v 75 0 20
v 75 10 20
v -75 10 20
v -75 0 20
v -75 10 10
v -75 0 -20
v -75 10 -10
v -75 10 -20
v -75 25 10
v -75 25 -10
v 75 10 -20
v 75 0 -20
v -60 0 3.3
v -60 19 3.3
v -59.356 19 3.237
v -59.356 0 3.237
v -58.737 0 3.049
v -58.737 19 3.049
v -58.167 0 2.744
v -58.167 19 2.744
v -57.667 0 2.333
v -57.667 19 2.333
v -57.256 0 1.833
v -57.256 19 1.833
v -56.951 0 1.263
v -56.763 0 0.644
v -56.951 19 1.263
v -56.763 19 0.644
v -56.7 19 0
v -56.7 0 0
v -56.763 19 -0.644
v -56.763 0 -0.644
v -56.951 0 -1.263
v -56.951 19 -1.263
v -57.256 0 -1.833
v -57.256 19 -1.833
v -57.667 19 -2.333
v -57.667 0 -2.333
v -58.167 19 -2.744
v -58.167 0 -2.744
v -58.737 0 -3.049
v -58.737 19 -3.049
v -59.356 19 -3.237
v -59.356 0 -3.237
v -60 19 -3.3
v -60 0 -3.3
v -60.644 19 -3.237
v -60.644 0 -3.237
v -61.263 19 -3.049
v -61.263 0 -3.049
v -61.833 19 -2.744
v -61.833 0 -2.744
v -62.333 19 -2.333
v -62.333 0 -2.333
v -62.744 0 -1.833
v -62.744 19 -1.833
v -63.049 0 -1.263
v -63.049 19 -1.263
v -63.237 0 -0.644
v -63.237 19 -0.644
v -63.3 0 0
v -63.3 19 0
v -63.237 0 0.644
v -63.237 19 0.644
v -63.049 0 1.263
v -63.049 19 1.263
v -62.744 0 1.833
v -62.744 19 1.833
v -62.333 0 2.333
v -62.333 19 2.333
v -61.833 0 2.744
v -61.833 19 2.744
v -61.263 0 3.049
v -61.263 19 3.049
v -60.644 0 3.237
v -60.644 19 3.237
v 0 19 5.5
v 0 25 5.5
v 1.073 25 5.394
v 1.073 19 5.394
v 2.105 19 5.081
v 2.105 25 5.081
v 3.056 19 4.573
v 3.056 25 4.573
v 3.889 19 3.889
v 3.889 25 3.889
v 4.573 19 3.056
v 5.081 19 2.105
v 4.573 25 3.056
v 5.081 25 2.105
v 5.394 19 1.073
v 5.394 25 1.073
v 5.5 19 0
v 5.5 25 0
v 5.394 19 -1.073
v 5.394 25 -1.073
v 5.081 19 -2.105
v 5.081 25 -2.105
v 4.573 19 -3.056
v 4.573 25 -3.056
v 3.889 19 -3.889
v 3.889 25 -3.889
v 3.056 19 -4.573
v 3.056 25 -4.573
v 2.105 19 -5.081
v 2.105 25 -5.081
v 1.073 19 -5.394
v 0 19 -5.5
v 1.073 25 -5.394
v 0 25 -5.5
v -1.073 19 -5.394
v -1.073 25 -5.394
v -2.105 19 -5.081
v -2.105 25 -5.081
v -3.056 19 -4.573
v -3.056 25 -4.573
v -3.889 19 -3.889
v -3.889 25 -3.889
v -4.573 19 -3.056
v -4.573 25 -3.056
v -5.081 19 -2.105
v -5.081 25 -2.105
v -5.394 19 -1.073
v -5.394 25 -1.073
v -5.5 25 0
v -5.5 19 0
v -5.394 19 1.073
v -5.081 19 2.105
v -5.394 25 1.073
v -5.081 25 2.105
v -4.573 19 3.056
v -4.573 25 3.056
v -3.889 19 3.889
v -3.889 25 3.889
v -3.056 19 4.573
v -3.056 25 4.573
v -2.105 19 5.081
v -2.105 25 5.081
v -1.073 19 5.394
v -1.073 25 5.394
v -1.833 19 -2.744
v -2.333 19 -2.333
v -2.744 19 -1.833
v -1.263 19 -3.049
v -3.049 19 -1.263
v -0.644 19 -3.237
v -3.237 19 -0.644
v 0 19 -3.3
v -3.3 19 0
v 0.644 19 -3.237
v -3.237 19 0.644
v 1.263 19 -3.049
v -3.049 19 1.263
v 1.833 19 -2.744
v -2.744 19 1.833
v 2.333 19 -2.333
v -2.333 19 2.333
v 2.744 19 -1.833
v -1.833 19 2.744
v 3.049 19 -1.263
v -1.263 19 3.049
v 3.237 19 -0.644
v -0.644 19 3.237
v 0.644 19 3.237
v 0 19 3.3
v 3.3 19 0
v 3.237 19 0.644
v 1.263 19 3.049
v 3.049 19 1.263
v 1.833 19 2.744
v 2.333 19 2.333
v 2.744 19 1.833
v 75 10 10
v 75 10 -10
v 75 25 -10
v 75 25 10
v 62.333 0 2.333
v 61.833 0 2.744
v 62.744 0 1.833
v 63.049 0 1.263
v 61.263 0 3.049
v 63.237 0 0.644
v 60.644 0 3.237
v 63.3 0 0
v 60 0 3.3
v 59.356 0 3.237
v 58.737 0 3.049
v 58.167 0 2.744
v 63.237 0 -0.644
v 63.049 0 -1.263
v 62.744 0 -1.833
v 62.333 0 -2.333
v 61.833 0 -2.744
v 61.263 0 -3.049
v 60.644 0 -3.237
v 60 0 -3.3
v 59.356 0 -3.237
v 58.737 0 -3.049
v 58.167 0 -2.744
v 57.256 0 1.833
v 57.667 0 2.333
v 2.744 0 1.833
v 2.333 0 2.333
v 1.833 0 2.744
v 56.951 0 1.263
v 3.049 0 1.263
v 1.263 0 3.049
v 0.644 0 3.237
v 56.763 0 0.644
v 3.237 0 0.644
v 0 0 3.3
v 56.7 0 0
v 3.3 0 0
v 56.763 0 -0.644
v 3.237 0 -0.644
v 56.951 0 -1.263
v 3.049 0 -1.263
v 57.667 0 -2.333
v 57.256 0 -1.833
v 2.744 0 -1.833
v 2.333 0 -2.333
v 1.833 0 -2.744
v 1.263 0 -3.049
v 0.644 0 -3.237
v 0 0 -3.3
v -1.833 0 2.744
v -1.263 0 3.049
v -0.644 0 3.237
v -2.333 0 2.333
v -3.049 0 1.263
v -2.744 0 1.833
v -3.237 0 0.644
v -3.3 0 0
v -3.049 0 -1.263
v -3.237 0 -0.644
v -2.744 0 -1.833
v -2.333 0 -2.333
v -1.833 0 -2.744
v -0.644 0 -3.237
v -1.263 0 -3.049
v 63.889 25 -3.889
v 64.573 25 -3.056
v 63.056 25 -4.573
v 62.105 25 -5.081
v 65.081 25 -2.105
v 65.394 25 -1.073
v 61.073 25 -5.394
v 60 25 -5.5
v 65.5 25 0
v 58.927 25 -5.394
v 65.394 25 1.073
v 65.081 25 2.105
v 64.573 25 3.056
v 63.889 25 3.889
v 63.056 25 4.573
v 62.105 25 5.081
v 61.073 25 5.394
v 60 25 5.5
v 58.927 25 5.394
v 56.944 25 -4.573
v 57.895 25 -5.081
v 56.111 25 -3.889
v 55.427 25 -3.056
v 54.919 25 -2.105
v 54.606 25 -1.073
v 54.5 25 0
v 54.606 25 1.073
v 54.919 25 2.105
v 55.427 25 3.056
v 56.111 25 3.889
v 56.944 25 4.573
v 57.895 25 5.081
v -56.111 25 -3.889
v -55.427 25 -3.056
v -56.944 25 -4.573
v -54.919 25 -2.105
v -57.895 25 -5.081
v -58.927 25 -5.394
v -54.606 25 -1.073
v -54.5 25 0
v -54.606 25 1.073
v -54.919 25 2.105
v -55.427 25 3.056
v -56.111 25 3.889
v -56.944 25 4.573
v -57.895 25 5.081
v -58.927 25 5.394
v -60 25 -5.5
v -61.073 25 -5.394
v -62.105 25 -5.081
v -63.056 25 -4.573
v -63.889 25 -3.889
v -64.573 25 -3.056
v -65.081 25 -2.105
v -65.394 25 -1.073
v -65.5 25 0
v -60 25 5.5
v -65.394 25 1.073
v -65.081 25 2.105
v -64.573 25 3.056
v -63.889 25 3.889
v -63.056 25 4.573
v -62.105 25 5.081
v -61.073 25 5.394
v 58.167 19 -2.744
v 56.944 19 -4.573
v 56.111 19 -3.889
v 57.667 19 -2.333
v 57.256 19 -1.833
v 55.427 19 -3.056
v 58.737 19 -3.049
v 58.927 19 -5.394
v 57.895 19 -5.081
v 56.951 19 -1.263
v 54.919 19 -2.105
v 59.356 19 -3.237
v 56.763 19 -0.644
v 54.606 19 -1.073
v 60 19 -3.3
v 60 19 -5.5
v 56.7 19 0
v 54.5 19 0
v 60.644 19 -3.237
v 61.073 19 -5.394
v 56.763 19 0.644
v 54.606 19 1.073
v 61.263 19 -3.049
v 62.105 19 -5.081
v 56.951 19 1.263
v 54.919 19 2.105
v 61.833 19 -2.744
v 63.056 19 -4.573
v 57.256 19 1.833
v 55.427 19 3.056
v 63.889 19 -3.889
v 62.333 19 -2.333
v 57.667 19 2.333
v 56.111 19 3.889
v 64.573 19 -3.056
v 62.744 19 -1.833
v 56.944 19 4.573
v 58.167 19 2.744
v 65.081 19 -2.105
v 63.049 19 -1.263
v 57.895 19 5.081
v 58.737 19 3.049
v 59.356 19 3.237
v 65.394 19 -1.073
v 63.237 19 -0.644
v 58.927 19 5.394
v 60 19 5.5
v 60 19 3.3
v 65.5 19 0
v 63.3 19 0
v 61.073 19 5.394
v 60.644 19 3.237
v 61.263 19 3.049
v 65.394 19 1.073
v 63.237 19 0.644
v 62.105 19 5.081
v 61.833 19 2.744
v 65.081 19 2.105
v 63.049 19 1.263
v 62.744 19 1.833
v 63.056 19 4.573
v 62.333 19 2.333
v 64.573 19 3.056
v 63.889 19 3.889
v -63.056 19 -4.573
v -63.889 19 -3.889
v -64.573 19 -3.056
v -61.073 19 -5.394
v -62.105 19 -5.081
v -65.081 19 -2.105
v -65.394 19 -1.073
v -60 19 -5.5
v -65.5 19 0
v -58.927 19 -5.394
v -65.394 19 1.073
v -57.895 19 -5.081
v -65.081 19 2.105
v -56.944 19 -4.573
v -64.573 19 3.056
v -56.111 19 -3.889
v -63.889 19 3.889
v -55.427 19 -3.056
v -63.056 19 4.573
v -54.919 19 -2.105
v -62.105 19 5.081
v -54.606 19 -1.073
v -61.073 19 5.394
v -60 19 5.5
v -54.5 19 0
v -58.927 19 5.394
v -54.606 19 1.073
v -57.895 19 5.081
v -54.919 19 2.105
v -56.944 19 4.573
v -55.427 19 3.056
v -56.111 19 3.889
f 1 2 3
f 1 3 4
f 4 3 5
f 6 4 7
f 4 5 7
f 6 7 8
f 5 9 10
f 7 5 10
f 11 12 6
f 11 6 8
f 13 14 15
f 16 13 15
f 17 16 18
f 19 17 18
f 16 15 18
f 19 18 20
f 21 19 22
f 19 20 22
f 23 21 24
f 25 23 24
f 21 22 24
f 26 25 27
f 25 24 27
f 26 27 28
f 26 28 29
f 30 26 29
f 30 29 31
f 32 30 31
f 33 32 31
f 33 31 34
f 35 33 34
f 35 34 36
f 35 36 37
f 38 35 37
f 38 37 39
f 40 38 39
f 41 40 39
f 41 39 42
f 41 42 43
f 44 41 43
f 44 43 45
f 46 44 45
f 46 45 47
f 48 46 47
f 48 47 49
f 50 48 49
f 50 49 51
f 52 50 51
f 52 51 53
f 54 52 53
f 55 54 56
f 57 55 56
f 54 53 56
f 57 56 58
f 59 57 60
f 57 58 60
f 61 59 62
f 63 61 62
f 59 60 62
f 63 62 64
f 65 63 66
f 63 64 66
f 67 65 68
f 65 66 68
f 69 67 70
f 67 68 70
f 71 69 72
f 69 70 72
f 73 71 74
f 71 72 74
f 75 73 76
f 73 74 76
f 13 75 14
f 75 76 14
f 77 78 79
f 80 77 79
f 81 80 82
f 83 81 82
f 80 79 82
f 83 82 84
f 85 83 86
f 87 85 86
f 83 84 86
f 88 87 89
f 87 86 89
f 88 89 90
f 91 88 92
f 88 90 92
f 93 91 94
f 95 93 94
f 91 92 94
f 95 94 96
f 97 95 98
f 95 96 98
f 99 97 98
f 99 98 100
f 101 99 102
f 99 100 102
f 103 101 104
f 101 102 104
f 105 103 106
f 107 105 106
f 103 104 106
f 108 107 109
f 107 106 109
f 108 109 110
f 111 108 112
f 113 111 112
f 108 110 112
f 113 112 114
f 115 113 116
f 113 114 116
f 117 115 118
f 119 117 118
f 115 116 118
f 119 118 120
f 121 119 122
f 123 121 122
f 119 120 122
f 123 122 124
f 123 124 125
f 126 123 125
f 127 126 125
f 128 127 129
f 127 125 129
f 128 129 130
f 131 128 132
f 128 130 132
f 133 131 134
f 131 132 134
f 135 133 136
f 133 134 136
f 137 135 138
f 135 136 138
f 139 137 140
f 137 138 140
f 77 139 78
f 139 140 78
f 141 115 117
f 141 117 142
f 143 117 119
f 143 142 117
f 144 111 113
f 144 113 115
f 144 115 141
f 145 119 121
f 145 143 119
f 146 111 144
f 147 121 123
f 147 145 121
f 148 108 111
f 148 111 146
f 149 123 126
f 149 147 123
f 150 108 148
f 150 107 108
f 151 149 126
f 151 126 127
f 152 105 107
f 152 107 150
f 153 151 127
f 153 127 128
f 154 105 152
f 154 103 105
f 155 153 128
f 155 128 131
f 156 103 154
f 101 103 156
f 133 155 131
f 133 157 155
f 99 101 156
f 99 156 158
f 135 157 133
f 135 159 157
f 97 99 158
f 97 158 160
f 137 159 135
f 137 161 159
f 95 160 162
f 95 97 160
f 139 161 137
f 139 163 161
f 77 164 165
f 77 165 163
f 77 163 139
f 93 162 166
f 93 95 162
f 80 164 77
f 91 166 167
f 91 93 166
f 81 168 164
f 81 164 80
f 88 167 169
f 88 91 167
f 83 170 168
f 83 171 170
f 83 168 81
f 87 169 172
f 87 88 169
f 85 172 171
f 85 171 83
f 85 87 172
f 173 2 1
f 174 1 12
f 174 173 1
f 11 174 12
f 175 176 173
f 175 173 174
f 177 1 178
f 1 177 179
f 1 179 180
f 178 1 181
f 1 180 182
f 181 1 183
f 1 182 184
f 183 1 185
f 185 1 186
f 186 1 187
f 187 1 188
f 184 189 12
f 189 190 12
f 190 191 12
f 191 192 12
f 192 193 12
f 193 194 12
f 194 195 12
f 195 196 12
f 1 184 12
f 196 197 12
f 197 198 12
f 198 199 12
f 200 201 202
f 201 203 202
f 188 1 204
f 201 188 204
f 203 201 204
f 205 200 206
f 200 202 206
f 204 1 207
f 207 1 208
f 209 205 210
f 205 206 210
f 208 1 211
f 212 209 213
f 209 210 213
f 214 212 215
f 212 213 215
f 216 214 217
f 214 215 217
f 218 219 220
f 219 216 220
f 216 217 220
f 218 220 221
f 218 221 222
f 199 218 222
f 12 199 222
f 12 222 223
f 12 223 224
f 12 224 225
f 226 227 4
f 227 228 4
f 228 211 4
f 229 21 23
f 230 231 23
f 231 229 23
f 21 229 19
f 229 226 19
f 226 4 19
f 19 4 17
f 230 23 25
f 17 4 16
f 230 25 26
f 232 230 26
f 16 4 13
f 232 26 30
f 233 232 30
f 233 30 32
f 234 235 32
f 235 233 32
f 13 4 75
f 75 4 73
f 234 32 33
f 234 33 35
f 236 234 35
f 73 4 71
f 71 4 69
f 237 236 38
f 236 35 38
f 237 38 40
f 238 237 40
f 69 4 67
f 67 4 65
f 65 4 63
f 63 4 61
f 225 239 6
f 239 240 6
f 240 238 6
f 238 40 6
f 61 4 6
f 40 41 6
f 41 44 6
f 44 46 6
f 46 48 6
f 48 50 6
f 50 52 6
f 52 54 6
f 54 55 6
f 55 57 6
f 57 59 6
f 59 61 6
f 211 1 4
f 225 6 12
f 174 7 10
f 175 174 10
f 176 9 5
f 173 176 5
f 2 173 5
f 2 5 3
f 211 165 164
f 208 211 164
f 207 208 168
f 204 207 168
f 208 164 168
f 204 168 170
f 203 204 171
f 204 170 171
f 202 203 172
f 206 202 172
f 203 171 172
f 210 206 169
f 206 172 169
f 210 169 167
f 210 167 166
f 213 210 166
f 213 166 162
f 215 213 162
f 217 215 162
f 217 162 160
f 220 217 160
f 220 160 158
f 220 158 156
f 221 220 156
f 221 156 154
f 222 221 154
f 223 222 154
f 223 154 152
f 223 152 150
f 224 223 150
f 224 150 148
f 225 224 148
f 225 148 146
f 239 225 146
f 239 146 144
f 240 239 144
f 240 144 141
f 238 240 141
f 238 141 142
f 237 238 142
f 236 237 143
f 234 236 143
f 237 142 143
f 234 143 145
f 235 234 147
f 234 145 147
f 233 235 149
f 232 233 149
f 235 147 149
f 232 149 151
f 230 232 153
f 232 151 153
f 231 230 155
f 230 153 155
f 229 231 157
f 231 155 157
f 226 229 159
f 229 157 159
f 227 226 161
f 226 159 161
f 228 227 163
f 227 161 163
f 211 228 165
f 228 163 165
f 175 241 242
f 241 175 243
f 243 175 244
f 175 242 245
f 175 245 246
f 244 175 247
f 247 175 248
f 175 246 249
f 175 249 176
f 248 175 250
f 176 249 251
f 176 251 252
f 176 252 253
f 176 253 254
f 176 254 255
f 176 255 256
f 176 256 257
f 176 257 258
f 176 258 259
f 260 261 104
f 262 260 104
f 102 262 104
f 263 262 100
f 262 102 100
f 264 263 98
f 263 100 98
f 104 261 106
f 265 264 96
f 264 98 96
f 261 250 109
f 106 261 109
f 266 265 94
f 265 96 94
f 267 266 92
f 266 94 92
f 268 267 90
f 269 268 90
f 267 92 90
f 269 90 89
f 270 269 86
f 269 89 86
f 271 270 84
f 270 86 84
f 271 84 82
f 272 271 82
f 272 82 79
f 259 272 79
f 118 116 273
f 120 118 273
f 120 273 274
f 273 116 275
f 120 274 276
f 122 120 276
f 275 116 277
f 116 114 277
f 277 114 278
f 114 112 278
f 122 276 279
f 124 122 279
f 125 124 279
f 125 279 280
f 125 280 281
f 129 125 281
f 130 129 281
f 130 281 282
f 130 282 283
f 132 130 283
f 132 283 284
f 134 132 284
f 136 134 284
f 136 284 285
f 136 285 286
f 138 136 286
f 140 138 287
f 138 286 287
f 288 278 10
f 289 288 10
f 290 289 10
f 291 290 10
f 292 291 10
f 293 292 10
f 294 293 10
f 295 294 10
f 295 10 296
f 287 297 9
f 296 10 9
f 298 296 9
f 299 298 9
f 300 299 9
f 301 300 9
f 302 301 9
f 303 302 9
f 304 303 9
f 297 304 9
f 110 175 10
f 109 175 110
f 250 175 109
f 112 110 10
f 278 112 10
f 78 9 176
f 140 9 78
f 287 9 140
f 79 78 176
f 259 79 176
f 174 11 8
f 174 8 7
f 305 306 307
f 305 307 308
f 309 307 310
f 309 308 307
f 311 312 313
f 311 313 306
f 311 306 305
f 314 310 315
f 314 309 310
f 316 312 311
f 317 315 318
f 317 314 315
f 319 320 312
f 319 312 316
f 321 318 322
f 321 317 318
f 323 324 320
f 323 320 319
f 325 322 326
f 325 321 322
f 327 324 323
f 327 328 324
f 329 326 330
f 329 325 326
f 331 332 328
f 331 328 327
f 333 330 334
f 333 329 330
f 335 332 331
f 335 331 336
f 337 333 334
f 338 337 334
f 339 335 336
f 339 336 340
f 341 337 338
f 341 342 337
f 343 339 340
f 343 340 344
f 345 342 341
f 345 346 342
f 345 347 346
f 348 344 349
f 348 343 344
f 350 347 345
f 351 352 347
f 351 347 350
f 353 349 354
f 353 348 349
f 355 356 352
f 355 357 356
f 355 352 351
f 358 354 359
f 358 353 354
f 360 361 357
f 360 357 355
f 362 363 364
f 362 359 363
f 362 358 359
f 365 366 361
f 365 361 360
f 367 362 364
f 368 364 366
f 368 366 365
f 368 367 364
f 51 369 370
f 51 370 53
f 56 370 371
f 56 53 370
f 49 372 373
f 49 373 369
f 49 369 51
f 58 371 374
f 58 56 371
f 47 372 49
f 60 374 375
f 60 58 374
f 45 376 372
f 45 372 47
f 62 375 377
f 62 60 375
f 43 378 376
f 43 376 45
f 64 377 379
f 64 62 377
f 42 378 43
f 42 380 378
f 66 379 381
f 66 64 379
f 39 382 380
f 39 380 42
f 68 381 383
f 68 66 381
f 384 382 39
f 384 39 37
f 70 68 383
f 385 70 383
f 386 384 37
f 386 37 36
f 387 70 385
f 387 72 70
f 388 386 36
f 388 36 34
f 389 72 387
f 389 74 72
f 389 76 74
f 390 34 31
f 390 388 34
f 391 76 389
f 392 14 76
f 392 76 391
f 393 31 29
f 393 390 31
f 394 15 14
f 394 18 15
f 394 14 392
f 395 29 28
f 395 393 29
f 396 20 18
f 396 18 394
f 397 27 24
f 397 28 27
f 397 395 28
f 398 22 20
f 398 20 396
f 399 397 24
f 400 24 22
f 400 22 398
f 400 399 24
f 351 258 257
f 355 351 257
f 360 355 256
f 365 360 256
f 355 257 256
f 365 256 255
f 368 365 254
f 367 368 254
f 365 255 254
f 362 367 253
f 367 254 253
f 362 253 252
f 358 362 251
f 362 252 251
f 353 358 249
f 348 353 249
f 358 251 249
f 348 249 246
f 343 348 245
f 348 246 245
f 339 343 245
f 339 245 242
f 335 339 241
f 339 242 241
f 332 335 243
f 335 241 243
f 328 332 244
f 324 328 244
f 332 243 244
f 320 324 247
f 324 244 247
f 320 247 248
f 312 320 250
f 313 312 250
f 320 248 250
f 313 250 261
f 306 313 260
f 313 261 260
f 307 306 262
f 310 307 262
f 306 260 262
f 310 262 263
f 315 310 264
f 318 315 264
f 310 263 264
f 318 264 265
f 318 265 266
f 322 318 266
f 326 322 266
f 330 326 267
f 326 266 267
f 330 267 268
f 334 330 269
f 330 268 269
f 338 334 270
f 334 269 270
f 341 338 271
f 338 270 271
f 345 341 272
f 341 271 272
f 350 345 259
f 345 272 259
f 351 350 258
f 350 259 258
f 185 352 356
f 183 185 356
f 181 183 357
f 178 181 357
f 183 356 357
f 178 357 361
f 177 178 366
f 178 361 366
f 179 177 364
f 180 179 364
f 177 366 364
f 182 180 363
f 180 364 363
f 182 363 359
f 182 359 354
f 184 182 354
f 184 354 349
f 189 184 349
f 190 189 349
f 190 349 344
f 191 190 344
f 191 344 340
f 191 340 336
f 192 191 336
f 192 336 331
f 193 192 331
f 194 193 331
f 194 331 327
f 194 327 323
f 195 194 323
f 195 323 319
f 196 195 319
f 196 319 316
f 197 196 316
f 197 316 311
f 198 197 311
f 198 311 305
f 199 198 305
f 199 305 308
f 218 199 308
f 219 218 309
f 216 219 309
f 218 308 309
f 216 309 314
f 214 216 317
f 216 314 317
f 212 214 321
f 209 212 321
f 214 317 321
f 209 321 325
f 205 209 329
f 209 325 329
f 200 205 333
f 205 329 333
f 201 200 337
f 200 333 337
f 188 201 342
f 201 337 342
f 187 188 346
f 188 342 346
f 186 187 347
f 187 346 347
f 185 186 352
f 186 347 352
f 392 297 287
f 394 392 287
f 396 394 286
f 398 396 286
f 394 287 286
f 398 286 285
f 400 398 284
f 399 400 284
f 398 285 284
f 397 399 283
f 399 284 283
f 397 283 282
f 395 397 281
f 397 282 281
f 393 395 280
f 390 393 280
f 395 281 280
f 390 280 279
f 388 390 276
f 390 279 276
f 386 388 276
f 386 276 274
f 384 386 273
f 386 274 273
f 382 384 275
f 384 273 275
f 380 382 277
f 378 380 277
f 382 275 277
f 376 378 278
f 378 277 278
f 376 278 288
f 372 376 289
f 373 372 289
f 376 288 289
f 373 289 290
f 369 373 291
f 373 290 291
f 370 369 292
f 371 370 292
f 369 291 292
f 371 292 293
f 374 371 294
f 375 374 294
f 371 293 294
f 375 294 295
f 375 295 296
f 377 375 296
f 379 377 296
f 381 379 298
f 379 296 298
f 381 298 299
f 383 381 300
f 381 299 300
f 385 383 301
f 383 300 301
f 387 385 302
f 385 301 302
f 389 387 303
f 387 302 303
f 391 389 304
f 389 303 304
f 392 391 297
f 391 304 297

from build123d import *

# Parameters (mm, degrees)
EXTRUDE_START       = -75
EXTRUDE_1_DEPTH     = 150
SKETCH_2_R          = 5.5
CUT_EXTRUDE_1_DEPTH = 6
SKETCH_3_R          = 3.3
CUT_EXTRUDE_2_DEPTH = 82.547532152


# Read off the part's stored shape, not the designer's step: 凸台-拉伸1
with BuildPart() as part:
    # 凸台-拉伸1 outline → 凸台-拉伸1 (new body)
    with BuildSketch(Plane(origin=(0, 0, 0), x_dir=(0, 0, -1), z_dir=(1, 0, 0)).offset(EXTRUDE_START)):
        Polygon((20, 0), (20, 10), (10, 10), (10, 25), (-10, 25), (-10, 10), (-20, 10), (-20, 0), align=None)
    extrude(amount=EXTRUDE_1_DEPTH)

    # 草图2 → 切除-拉伸1 (cut)
    with BuildSketch(Plane(origin=(0, 25, 0), x_dir=(1, 0, 0), z_dir=(0, 1, 0))):
        with Locations(Location((-60, 0, 0), (0, 0, 270))):
            Circle(SKETCH_2_R)
        with Locations(Location((0, 0, 0), (0, 0, 270))):
            Circle(SKETCH_2_R)
        with Locations(Location((60, 0, 0), (0, 0, 270))):
            Circle(SKETCH_2_R)
    extrude(amount=-CUT_EXTRUDE_1_DEPTH, mode=Mode.SUBTRACT)

    # 草图3 → 切除-拉伸2 (cut, through all)
    with BuildSketch(Plane(origin=(0, 25, 0), x_dir=(1, 0, 0), z_dir=(0, 1, 0))):
        with Locations(Location((-60, 0, 0), (0, 0, 270))):
            Circle(SKETCH_3_R)
        with Locations(Location((0, 0, 0), (0, 0, 270))):
            Circle(SKETCH_3_R)
        with Locations(Location((60, 0, 0), (0, 0, 270))):
            Circle(SKETCH_3_R)
    extrude(amount=-CUT_EXTRUDE_2_DEPTH, mode=Mode.SUBTRACT)


solid = part.part
